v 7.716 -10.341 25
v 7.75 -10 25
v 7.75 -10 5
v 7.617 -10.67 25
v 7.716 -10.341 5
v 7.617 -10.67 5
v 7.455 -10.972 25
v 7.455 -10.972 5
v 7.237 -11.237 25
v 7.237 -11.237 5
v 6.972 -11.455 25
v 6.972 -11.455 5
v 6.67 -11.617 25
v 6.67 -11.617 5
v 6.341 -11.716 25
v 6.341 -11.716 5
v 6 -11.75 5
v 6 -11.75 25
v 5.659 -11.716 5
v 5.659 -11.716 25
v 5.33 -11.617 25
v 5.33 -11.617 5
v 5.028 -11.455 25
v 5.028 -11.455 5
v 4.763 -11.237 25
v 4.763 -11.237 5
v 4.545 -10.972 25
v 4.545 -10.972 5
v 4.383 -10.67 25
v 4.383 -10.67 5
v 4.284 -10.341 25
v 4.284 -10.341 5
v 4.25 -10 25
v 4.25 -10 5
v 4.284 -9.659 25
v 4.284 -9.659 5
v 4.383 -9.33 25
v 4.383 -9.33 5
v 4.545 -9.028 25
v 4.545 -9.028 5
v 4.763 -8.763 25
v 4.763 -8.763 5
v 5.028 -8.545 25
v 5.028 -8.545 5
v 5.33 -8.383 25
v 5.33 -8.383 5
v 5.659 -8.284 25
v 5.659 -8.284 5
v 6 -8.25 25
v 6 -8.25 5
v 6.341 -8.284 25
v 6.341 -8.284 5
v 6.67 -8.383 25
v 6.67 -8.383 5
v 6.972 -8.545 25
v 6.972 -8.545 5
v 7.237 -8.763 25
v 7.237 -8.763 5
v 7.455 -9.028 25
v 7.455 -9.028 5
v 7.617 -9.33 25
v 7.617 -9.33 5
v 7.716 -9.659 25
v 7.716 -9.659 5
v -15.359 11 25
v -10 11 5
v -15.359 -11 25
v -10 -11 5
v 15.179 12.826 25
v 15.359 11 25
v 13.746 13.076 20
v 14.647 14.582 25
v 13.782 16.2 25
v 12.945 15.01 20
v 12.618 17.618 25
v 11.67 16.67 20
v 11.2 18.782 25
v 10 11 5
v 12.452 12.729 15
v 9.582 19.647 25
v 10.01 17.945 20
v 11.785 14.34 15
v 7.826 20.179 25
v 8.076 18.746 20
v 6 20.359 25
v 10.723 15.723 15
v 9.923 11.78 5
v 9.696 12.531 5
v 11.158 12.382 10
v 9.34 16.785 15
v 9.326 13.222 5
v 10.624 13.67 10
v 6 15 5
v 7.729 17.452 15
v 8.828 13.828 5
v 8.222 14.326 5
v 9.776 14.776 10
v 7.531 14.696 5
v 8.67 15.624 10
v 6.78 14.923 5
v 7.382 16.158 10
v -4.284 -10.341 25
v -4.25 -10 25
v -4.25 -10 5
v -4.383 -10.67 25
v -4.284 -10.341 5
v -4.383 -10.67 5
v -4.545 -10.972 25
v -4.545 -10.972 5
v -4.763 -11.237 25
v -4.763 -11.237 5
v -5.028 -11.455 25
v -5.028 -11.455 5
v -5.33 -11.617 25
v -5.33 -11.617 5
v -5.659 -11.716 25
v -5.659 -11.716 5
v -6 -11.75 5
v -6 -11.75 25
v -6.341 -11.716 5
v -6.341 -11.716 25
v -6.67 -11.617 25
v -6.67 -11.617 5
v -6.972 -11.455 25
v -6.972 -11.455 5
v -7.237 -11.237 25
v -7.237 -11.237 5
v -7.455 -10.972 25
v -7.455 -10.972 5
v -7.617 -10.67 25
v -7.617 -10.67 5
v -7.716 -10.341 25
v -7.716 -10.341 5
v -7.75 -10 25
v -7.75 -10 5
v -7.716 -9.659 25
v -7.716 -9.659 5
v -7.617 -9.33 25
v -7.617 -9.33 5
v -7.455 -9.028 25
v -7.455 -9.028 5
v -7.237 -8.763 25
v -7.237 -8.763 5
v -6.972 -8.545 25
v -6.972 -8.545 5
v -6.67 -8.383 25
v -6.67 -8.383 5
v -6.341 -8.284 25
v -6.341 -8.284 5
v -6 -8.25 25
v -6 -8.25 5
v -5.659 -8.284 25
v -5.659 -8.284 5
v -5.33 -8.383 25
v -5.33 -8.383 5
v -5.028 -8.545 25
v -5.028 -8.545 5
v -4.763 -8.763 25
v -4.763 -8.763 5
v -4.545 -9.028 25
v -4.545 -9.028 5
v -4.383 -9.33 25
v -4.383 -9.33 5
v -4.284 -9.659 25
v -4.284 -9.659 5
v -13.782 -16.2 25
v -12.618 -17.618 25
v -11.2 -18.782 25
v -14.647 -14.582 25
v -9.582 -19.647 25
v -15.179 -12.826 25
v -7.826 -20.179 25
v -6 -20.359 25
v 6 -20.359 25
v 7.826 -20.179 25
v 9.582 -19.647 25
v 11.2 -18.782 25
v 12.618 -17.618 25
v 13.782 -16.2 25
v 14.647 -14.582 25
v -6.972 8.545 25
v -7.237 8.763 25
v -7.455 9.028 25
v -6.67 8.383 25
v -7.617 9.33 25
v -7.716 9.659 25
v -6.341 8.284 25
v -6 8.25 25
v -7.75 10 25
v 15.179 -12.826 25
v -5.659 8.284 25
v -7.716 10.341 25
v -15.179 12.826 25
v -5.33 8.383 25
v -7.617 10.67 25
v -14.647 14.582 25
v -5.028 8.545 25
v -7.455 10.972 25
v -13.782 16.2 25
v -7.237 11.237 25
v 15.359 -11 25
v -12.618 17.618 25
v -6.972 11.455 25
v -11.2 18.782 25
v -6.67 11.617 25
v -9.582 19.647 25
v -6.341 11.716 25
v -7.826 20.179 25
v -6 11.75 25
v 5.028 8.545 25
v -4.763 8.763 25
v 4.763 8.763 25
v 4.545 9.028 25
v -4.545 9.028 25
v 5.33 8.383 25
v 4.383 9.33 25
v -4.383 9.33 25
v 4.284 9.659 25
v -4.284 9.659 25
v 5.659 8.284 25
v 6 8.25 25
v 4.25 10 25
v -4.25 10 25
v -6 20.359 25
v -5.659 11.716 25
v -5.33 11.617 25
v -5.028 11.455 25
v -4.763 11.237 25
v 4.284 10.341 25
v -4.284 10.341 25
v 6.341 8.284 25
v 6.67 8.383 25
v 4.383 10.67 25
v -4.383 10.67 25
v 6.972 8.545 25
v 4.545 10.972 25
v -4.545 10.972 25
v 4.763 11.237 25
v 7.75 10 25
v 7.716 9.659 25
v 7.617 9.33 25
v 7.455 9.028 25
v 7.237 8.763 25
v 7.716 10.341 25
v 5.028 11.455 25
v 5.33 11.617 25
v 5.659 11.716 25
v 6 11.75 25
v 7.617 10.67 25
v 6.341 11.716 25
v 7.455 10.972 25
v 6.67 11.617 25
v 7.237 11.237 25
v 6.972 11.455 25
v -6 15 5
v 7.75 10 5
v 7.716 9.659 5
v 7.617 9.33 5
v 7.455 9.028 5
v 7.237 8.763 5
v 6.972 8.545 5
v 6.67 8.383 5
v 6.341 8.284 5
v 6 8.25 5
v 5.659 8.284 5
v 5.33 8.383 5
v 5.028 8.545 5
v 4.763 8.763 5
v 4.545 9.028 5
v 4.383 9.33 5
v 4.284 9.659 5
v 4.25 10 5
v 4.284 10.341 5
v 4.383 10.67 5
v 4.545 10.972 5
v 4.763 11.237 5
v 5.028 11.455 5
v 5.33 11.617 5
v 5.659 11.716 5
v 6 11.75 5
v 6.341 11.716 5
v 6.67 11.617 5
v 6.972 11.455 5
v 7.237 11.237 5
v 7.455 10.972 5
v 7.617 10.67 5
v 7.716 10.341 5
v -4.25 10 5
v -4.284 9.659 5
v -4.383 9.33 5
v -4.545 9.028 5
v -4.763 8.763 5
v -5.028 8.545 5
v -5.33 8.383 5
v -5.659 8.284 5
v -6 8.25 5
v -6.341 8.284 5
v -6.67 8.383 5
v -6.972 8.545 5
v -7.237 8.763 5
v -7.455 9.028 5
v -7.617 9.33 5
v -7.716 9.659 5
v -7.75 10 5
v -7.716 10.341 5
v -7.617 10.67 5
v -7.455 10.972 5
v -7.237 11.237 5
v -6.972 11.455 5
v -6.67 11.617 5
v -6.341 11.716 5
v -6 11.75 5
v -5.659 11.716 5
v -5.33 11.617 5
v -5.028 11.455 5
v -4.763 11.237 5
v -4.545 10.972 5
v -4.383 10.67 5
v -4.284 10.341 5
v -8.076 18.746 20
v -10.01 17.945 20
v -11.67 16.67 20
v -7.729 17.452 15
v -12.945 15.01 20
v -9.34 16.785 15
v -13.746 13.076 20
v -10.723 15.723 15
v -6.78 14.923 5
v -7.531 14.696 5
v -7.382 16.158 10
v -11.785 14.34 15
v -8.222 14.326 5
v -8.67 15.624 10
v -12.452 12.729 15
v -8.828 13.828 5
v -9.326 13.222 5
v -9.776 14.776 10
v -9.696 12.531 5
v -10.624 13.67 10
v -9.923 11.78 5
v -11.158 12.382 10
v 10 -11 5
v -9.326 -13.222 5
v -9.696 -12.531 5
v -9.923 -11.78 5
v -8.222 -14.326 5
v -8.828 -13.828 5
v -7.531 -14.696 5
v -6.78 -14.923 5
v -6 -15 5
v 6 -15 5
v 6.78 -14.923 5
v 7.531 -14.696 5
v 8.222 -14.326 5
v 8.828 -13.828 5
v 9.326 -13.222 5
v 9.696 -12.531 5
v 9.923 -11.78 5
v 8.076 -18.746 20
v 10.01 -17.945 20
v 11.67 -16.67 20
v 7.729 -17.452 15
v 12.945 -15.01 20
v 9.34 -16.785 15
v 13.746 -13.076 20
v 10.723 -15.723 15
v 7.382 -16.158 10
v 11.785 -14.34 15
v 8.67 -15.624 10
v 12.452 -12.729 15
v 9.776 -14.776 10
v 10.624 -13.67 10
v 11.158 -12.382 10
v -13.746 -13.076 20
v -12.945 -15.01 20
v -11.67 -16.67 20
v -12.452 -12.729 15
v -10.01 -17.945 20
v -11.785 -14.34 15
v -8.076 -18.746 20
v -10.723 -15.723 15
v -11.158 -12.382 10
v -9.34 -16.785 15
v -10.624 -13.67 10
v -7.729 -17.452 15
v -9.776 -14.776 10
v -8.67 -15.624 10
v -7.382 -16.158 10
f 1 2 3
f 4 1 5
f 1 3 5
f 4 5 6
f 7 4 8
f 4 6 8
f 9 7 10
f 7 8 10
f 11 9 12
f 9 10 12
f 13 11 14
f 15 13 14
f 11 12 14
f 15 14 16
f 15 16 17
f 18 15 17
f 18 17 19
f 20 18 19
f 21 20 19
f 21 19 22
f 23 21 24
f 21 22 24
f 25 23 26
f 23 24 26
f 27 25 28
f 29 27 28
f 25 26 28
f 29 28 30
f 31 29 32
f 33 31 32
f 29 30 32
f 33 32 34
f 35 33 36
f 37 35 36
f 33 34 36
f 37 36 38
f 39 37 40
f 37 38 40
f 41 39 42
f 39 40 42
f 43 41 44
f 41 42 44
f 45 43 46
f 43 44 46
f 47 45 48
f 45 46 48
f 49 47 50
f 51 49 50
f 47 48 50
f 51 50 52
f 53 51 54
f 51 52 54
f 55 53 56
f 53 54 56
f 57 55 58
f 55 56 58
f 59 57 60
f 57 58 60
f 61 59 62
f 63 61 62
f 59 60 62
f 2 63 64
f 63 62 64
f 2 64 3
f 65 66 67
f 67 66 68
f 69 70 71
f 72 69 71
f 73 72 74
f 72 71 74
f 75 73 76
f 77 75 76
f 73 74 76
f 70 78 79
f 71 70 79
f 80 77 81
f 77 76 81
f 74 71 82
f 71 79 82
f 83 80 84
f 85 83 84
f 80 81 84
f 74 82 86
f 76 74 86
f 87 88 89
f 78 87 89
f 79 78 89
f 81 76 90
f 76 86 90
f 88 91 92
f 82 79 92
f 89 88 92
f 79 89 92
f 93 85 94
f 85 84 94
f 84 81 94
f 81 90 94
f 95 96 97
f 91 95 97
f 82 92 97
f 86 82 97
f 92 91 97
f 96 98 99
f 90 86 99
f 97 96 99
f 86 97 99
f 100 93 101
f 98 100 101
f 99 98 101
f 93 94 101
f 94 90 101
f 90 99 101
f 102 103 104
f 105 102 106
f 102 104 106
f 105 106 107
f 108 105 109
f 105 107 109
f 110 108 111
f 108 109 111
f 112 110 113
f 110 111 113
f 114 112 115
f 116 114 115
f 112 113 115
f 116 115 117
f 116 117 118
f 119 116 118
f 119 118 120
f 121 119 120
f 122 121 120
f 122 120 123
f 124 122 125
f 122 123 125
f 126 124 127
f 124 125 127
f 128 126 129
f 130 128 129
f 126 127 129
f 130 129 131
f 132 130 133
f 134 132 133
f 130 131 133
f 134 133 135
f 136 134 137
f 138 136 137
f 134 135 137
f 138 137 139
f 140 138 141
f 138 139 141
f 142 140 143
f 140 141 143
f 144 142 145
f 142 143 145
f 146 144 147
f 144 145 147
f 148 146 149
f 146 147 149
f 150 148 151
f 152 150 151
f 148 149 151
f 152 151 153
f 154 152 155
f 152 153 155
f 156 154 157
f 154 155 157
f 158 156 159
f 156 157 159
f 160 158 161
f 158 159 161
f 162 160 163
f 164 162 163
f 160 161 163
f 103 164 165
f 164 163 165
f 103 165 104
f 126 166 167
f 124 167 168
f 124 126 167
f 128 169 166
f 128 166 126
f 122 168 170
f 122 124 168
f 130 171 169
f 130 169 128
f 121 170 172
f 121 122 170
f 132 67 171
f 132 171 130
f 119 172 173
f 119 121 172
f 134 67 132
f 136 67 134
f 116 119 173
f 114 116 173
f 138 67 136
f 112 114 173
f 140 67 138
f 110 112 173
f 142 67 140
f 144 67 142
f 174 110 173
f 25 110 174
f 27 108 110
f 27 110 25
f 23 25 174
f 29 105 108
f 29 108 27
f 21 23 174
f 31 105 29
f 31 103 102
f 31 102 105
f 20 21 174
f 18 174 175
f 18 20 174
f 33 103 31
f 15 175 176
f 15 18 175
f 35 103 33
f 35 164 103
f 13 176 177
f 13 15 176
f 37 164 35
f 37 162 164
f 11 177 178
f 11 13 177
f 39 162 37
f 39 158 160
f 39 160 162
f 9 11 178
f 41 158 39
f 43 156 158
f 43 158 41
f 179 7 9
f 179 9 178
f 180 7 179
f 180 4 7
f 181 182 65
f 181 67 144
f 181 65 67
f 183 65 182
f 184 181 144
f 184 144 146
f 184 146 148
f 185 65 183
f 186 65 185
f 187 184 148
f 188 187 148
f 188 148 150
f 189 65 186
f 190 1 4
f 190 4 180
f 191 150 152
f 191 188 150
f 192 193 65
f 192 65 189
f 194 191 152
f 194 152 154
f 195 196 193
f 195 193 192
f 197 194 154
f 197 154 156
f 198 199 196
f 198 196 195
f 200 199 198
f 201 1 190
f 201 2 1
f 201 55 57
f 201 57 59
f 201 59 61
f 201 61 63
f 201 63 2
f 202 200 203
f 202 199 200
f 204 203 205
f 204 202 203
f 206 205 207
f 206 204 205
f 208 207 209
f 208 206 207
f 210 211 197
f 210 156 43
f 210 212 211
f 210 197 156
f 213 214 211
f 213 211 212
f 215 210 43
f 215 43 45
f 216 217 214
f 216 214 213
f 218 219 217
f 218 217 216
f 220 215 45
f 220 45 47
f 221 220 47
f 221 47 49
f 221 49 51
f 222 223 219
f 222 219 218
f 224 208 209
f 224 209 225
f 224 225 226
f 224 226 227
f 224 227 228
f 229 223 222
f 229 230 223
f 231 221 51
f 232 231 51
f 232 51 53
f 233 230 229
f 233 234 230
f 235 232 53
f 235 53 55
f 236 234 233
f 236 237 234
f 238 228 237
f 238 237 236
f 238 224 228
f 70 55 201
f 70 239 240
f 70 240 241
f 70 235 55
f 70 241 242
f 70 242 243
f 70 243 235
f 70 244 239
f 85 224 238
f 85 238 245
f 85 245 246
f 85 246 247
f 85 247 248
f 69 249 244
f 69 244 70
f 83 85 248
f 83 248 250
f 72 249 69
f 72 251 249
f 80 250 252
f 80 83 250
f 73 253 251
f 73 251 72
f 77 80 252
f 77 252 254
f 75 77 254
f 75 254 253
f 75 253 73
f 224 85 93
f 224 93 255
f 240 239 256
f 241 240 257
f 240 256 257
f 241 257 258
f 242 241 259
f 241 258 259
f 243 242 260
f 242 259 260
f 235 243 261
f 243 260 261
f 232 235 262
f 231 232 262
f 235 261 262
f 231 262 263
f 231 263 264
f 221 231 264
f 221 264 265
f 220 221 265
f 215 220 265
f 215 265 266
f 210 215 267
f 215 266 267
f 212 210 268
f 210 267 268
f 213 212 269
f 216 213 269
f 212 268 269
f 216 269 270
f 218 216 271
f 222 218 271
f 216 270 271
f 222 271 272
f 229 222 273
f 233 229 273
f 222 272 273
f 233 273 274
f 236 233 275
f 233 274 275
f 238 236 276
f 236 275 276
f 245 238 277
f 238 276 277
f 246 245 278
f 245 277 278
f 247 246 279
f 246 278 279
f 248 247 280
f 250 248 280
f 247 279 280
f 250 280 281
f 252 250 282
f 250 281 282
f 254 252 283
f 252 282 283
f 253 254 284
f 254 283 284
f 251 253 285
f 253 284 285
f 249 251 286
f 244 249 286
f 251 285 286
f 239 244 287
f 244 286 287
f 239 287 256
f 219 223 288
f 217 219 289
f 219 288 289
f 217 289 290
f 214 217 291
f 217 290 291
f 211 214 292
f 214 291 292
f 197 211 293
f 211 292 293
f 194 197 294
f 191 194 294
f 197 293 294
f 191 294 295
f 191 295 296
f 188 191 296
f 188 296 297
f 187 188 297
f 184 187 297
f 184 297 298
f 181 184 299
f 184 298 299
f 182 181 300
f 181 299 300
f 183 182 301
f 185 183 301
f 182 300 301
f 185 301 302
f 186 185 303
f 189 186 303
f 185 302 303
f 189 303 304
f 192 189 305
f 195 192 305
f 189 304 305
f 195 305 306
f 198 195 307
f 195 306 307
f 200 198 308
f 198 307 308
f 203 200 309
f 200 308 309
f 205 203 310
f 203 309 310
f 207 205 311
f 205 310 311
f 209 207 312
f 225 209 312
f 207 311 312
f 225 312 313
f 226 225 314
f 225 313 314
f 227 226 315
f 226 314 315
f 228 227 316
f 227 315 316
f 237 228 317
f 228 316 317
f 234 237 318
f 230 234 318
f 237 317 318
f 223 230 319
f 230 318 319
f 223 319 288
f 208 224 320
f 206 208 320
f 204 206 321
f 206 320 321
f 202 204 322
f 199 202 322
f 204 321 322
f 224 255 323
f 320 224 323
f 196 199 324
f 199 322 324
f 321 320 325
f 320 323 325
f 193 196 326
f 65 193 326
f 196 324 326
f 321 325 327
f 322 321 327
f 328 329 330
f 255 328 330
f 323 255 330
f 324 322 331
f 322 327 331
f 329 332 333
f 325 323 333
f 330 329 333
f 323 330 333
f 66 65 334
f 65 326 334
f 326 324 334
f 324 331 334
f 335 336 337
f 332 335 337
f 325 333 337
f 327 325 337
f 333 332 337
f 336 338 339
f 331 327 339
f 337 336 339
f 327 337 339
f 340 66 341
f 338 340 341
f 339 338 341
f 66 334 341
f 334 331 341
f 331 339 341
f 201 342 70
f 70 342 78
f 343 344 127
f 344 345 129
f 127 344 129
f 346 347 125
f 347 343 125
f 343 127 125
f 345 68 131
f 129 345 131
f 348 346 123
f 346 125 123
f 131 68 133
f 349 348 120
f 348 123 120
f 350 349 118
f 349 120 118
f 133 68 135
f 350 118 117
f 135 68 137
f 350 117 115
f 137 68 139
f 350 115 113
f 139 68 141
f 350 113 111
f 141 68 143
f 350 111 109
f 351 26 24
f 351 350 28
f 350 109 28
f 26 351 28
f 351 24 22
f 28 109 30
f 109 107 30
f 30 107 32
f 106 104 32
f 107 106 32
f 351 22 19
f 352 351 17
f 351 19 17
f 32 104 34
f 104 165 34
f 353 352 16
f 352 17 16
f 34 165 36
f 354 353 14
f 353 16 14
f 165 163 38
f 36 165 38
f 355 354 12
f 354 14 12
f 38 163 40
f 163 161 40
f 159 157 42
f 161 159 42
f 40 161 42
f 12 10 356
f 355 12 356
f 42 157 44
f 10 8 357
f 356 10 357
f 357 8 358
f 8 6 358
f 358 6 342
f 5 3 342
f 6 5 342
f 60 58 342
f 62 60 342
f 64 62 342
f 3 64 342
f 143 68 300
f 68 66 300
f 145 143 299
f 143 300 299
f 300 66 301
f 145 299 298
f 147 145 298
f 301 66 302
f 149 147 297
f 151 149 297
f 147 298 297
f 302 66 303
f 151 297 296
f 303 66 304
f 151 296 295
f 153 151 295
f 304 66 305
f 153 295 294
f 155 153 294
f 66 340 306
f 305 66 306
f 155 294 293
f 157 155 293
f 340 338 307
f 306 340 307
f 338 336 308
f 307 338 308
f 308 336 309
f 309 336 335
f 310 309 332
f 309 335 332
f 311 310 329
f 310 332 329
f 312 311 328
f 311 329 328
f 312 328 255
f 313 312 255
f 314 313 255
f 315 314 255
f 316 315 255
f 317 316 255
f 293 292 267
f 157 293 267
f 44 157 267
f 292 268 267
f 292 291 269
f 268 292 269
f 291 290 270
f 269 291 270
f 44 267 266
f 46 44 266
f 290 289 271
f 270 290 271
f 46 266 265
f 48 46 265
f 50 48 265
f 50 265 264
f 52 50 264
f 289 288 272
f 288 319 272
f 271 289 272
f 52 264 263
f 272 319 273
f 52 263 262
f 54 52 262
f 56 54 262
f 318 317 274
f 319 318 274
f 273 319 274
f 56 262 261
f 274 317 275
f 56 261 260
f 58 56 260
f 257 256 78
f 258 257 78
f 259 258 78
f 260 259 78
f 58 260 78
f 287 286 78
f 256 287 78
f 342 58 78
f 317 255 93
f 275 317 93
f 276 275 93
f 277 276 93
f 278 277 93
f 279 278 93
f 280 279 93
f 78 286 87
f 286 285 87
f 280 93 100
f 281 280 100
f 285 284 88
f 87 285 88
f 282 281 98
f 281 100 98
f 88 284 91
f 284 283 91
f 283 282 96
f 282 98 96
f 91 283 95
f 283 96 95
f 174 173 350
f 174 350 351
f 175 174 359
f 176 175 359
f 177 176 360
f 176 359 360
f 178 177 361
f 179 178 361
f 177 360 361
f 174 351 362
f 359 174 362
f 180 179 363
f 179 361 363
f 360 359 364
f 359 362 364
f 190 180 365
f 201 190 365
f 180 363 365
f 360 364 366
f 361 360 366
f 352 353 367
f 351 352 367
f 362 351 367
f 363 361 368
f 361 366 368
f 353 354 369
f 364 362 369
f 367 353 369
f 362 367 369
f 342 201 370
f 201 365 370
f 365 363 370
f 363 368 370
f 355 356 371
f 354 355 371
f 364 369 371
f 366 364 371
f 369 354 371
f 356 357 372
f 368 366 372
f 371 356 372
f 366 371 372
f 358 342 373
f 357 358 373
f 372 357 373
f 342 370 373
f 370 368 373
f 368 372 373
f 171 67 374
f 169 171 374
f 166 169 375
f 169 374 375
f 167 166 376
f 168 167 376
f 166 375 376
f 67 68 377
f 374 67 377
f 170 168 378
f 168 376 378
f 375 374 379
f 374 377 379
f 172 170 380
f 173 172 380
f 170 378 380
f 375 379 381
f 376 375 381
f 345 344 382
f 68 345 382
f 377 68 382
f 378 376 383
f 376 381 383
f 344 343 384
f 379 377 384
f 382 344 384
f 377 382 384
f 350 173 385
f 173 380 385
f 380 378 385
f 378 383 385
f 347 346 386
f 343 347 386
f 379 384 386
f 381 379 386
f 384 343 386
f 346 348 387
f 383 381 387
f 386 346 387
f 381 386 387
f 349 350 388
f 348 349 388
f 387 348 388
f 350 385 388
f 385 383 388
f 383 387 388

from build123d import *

# Parameters (mm, degrees)
SKETCH1_R           = 1.75
BOSS_EXTRUDE1_DEPTH = 5
BOSS_EXTRUDE2_DEPTH = 20
BOSS_EXTRUDE2_DRAFT = -15
CUT_EXTRUDE1_REACH  = 37.713
SKETCH5_R           = 1.75
CUT_EXTRUDE2_DEPTH  = 5


with BuildPart() as part:
    # Sketch1 → Boss-Extrude1 (new body)
    with BuildSketch(Plane.XY):
        with BuildLine():
            Line((-6, 15), (6, 15))
            ThreePointArc((6, 15), (8.828427125, 13.828427125), (10, 11))
            Line((10, 11), (10, -11))
            ThreePointArc((10, -11), (8.828427125, -13.828427125), (6, -15))
            Line((6, -15), (-6, -15))
            ThreePointArc((-6, -15), (-8.828427125, -13.828427125), (-10, -11))
            Line((-10, -11), (-10, 11))
            ThreePointArc((-10, 11), (-8.828427125, 13.828427125), (-6, 15))
        make_face()
        with Locations((-6, 10)):
            Circle(SKETCH1_R, mode=Mode.SUBTRACT)
        with Locations((6, 10)):
            Circle(SKETCH1_R, mode=Mode.SUBTRACT)
        with Locations((-6, -10)):
            Circle(SKETCH1_R, mode=Mode.SUBTRACT)
        with Locations((6, -10)):
            Circle(SKETCH1_R, mode=Mode.SUBTRACT)
    extrude(amount=BOSS_EXTRUDE1_DEPTH)


with BuildPart() as boss_extrude2_tool:
    # Sketch4 → Boss-Extrude2 (with draft: the straight prism first)
    with BuildSketch(Plane.XY.offset(5)):
        with BuildLine():
            Line((-6, -15), (6, -15))
            ThreePointArc((6, -15), (8.828427125, -13.828427125), (10, -11))
            Line((10, -11), (10, 11))
            ThreePointArc((10, 11), (8.828427125, 13.828427125), (6, 15))
            Line((6, 15), (-6, 15))
            ThreePointArc((-6, 15), (-8.828427125, 13.828427125), (-10, 11))
            Line((-10, 11), (-10, -11))
            ThreePointArc((-10, -11), (-8.828427125, -13.828427125), (-6, -15))
        make_face()
    extrude(amount=BOSS_EXTRUDE2_DEPTH)
    # Boss-Extrude2: the draft: its side faces are tilted about the plane it starts from
    boss_extrude2_sides = [boss_extrude2_tool.faces().sort_by_distance(p)[0] for p in [
        (-10, 0, 15),
        (-8.828427125, -13.828427125, 15),
        (0, -15, 15),
        (8.828427125, -13.828427125, 15),
        (10, 0, 15),
        (8.828427125, 13.828427125, 15),
        (0, 15, 15),
        (-8.828427125, 13.828427125, 15),
    ]]
    draft(boss_extrude2_sides, Plane.XY.offset(5), BOSS_EXTRUDE2_DRAFT)


with BuildPart() as part_1:
    add(part.part)

    # Boss-Extrude2: add boss_extrude2_tool
    add(boss_extrude2_tool.part)

    # Sketch5 → Cut-Extrude1 (cut, up to next)
    with BuildSketch(Plane(origin=(0, 0, 0), x_dir=(-1, 0, 0), z_dir=(0, 0, -1)), mode=Mode.PRIVATE) as cut_extrude1_sk1:
        with Locations(Location((-6, -10, 0), (0, 0, 180))):
            Circle(SKETCH5_R)
    cut_extrude1_tool1 = extrude(cut_extrude1_sk1.sketch, amount=-CUT_EXTRUDE1_REACH, mode=Mode.PRIVATE) & part_1.part
    # Sketch5 → Cut-Extrude1 (cut, up to next)
    with BuildSketch(Plane(origin=(0, 0, 0), x_dir=(-1, 0, 0), z_dir=(0, 0, -1)), mode=Mode.PRIVATE) as cut_extrude1_sk2:
        with Locations(Location((6, -10, 0), (0, 0, 180))):
            Circle(SKETCH5_R)
    cut_extrude1_tool2 = extrude(cut_extrude1_sk2.sketch, amount=-CUT_EXTRUDE1_REACH, mode=Mode.PRIVATE) & part_1.part
    # Sketch5 → Cut-Extrude1 (cut, up to next)
    with BuildSketch(Plane(origin=(0, 0, 0), x_dir=(-1, 0, 0), z_dir=(0, 0, -1)), mode=Mode.PRIVATE) as cut_extrude1_sk3:
        with Locations(Location((6, 10, 0), (0, 0, 180))):
            Circle(SKETCH5_R)
    cut_extrude1_tool3 = extrude(cut_extrude1_sk3.sketch, amount=-CUT_EXTRUDE1_REACH, mode=Mode.PRIVATE) & part_1.part
    # Sketch5 → Cut-Extrude1 (cut, up to next)
    with BuildSketch(Plane(origin=(0, 0, 0), x_dir=(-1, 0, 0), z_dir=(0, 0, -1)), mode=Mode.PRIVATE) as cut_extrude1_sk4:
        with Locations(Location((-6, 10, 0), (0, 0, 180))):
            Circle(SKETCH5_R)
    cut_extrude1_tool4 = extrude(cut_extrude1_sk4.sketch, amount=-CUT_EXTRUDE1_REACH, mode=Mode.PRIVATE) & part_1.part
    add(cut_extrude1_tool1.solids().sort_by_distance((6, -10, 0))[0], mode=Mode.SUBTRACT)
    add(cut_extrude1_tool2.solids().sort_by_distance((-6, -10, 0))[0], mode=Mode.SUBTRACT)
    add(cut_extrude1_tool3.solids().sort_by_distance((-6, 10, 0))[0], mode=Mode.SUBTRACT)
    add(cut_extrude1_tool4.solids().sort_by_distance((6, 10, 0))[0], mode=Mode.SUBTRACT)

    # Sketch6 → Cut-Extrude2 (cut)
    with BuildSketch(Plane(origin=(0, 0, 0), x_dir=(-1, 0, 0), z_dir=(0, 0, -1))):
        with BuildLine():
            Line((6, -15), (-6, -15))
            ThreePointArc((-6, -15), (-8.828427125, -13.828427125), (-10, -11))
            Line((-10, -11), (-10, 11))
            ThreePointArc((-10, 11), (-8.828427125, 13.828427125), (-6, 15))
            Line((-6, 15), (6, 15))
            ThreePointArc((6, 15), (8.828427125, 13.828427125), (10, 11))
            Line((10, 11), (10, -11))
            ThreePointArc((10, -11), (8.828427125, -13.828427125), (6, -15))
        make_face()
    extrude(amount=-CUT_EXTRUDE2_DEPTH, mode=Mode.SUBTRACT)


solid = part_1.part
